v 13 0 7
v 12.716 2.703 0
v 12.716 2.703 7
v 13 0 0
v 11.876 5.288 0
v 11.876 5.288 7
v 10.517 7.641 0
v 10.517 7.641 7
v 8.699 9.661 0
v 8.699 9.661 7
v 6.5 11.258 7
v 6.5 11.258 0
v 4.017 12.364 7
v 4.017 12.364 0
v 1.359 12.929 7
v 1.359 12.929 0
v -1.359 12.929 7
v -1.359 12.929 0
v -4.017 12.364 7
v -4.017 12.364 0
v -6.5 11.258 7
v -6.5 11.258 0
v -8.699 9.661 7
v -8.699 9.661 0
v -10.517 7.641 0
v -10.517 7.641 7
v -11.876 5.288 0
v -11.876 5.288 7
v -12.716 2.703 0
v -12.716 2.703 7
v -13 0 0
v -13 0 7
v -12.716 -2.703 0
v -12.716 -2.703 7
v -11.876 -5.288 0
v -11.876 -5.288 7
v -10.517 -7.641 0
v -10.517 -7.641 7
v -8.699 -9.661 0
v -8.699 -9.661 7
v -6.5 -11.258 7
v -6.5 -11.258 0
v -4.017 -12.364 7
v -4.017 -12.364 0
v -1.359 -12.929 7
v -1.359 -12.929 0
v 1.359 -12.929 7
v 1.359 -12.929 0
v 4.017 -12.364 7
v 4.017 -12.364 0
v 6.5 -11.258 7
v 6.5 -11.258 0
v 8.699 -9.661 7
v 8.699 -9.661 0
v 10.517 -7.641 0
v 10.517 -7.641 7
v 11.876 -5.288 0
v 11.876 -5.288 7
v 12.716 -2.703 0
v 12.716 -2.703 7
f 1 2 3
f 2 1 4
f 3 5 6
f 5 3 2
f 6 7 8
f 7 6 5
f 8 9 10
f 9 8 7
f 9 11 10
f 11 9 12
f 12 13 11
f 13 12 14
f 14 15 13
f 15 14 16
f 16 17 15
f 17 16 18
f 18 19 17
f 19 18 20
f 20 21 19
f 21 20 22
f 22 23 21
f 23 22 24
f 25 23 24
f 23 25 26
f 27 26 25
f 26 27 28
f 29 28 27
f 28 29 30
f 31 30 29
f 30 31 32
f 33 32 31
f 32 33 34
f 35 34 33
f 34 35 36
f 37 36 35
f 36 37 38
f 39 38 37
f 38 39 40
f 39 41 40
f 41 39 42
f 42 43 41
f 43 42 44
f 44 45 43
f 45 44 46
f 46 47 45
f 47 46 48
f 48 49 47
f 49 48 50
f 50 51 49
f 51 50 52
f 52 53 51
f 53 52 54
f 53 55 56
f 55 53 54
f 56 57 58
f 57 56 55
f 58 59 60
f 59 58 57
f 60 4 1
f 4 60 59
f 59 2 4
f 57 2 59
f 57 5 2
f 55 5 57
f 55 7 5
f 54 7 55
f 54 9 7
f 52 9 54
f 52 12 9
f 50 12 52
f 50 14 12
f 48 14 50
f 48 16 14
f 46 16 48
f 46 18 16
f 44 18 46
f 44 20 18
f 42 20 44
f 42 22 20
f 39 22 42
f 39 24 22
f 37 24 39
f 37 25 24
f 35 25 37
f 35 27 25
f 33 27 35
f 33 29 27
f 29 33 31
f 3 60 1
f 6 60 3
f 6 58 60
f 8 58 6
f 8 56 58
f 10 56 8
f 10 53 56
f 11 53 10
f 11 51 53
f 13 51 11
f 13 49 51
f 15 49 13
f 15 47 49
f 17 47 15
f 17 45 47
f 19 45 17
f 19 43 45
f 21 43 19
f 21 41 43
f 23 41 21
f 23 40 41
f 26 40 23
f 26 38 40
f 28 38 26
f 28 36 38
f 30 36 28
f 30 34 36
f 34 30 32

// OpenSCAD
// Generated by SolidPython 1.0.1 on 2020-07-29 00:39:25


cylinder(h = 7, r1 = 13, r2 = 13);
/***********************************************
*********      SolidPython code:      **********
************************************************
 
# import packages: SolidPython
from solid import *
from solid.utils import *
from itertools import chain, combinations


class Resize:

    def __init__(self, scad_file):
        self.scad_file = scad_file
        #self.scad_file = import_scad(scad_file)
        # cone/cylinder param:
        self.r1 = 0
        self.r2 = 0
        self.h = 0
        # rectangular prism param:
        self.w = 0
        self.l = 0
        # ellipse param:
        self.r = 0

    # import OpenScad code (file name corresponds to shape)


    # classify shape + parameters
    def assign(self, param1, param2, param3):
        if self.scad_file == 'cone.scad':
            self.r1 = param1
            self.r2 = param2
            self.h = param3
        elif self.scad_file == 'cylinder.scad':
            self.r1 = param1
            self.r2 = param2
            self.h = param3
        elif self.scad_file == 'rectangularPrism.scad':
            self.h = param1
            self.l = param2
            self.w = param3
        else:
            self.r = param1
            self.h = param2

    # resize parameters
    def iterate(self):
        x = range(3, 20, 2)
        i = 1
        if self.scad_file == 'cone.scad':
            tempList = list(combinations(x, 2))
            for temp in tempList:
                param1 = temp[0]
                param2 = temp[1]
                filepath = 'produced_scad_files/' + 'cone' + str(param1) + '_' + str(param2) + '_' + '.scad'
                scad_render_to_file(cylinder(h=param1, r1=param2, r2=0), filepath)

        elif self.scad_file == 'cylinder.scad':
            tempList = list(combinations(x, 3))
            for temp in tempList:
                param1 = temp[0]
                param2 = temp[1]
                filepath = 'produced_scad_files/' + 'cylinder' + str(param1) + '_' + str(param2) + '_' + '.scad'
                scad_render_to_file(cylinder(h=param1, r1=param2, r2=param2), filepath)

        elif self.scad_file == 'rectangularPrism.scad':
            tempList = list(combinations(x, 3))
            for temp in tempList:
                param1 = temp[0]
                param2 = temp[1]
                param3 = temp[2]
                filepath = 'produced_scad_files/' + 'rectangularPrism' + str(param1) + '_' + str(param2) + '_' + str(
                    param3) + '.scad'
                scad_render_to_file(cube(size=(param1, param2, param3)), filepath)

        elif self.scad_file == 'ellipse.scad':
            tempList = list(combinations(x, 4))
            for temp in tempList:
                param1 = temp[0]
                param2 = temp[1]
                param3 = temp[2]
                param4 = temp[3]
                filepath = 'produced_scad_files/' + 'ellipse' + str(param1) + '_' + str(param2) + '_' + str(param3) + '_' + str(param4) + '.scad'
                scad_render_to_file(scale([param1, param2, param3])(sphere(r=param4)), filepath)

    def render_to_scadfile(self):
        scad_render_to_file(scad, 'example.scad') 
 
************************************************/
